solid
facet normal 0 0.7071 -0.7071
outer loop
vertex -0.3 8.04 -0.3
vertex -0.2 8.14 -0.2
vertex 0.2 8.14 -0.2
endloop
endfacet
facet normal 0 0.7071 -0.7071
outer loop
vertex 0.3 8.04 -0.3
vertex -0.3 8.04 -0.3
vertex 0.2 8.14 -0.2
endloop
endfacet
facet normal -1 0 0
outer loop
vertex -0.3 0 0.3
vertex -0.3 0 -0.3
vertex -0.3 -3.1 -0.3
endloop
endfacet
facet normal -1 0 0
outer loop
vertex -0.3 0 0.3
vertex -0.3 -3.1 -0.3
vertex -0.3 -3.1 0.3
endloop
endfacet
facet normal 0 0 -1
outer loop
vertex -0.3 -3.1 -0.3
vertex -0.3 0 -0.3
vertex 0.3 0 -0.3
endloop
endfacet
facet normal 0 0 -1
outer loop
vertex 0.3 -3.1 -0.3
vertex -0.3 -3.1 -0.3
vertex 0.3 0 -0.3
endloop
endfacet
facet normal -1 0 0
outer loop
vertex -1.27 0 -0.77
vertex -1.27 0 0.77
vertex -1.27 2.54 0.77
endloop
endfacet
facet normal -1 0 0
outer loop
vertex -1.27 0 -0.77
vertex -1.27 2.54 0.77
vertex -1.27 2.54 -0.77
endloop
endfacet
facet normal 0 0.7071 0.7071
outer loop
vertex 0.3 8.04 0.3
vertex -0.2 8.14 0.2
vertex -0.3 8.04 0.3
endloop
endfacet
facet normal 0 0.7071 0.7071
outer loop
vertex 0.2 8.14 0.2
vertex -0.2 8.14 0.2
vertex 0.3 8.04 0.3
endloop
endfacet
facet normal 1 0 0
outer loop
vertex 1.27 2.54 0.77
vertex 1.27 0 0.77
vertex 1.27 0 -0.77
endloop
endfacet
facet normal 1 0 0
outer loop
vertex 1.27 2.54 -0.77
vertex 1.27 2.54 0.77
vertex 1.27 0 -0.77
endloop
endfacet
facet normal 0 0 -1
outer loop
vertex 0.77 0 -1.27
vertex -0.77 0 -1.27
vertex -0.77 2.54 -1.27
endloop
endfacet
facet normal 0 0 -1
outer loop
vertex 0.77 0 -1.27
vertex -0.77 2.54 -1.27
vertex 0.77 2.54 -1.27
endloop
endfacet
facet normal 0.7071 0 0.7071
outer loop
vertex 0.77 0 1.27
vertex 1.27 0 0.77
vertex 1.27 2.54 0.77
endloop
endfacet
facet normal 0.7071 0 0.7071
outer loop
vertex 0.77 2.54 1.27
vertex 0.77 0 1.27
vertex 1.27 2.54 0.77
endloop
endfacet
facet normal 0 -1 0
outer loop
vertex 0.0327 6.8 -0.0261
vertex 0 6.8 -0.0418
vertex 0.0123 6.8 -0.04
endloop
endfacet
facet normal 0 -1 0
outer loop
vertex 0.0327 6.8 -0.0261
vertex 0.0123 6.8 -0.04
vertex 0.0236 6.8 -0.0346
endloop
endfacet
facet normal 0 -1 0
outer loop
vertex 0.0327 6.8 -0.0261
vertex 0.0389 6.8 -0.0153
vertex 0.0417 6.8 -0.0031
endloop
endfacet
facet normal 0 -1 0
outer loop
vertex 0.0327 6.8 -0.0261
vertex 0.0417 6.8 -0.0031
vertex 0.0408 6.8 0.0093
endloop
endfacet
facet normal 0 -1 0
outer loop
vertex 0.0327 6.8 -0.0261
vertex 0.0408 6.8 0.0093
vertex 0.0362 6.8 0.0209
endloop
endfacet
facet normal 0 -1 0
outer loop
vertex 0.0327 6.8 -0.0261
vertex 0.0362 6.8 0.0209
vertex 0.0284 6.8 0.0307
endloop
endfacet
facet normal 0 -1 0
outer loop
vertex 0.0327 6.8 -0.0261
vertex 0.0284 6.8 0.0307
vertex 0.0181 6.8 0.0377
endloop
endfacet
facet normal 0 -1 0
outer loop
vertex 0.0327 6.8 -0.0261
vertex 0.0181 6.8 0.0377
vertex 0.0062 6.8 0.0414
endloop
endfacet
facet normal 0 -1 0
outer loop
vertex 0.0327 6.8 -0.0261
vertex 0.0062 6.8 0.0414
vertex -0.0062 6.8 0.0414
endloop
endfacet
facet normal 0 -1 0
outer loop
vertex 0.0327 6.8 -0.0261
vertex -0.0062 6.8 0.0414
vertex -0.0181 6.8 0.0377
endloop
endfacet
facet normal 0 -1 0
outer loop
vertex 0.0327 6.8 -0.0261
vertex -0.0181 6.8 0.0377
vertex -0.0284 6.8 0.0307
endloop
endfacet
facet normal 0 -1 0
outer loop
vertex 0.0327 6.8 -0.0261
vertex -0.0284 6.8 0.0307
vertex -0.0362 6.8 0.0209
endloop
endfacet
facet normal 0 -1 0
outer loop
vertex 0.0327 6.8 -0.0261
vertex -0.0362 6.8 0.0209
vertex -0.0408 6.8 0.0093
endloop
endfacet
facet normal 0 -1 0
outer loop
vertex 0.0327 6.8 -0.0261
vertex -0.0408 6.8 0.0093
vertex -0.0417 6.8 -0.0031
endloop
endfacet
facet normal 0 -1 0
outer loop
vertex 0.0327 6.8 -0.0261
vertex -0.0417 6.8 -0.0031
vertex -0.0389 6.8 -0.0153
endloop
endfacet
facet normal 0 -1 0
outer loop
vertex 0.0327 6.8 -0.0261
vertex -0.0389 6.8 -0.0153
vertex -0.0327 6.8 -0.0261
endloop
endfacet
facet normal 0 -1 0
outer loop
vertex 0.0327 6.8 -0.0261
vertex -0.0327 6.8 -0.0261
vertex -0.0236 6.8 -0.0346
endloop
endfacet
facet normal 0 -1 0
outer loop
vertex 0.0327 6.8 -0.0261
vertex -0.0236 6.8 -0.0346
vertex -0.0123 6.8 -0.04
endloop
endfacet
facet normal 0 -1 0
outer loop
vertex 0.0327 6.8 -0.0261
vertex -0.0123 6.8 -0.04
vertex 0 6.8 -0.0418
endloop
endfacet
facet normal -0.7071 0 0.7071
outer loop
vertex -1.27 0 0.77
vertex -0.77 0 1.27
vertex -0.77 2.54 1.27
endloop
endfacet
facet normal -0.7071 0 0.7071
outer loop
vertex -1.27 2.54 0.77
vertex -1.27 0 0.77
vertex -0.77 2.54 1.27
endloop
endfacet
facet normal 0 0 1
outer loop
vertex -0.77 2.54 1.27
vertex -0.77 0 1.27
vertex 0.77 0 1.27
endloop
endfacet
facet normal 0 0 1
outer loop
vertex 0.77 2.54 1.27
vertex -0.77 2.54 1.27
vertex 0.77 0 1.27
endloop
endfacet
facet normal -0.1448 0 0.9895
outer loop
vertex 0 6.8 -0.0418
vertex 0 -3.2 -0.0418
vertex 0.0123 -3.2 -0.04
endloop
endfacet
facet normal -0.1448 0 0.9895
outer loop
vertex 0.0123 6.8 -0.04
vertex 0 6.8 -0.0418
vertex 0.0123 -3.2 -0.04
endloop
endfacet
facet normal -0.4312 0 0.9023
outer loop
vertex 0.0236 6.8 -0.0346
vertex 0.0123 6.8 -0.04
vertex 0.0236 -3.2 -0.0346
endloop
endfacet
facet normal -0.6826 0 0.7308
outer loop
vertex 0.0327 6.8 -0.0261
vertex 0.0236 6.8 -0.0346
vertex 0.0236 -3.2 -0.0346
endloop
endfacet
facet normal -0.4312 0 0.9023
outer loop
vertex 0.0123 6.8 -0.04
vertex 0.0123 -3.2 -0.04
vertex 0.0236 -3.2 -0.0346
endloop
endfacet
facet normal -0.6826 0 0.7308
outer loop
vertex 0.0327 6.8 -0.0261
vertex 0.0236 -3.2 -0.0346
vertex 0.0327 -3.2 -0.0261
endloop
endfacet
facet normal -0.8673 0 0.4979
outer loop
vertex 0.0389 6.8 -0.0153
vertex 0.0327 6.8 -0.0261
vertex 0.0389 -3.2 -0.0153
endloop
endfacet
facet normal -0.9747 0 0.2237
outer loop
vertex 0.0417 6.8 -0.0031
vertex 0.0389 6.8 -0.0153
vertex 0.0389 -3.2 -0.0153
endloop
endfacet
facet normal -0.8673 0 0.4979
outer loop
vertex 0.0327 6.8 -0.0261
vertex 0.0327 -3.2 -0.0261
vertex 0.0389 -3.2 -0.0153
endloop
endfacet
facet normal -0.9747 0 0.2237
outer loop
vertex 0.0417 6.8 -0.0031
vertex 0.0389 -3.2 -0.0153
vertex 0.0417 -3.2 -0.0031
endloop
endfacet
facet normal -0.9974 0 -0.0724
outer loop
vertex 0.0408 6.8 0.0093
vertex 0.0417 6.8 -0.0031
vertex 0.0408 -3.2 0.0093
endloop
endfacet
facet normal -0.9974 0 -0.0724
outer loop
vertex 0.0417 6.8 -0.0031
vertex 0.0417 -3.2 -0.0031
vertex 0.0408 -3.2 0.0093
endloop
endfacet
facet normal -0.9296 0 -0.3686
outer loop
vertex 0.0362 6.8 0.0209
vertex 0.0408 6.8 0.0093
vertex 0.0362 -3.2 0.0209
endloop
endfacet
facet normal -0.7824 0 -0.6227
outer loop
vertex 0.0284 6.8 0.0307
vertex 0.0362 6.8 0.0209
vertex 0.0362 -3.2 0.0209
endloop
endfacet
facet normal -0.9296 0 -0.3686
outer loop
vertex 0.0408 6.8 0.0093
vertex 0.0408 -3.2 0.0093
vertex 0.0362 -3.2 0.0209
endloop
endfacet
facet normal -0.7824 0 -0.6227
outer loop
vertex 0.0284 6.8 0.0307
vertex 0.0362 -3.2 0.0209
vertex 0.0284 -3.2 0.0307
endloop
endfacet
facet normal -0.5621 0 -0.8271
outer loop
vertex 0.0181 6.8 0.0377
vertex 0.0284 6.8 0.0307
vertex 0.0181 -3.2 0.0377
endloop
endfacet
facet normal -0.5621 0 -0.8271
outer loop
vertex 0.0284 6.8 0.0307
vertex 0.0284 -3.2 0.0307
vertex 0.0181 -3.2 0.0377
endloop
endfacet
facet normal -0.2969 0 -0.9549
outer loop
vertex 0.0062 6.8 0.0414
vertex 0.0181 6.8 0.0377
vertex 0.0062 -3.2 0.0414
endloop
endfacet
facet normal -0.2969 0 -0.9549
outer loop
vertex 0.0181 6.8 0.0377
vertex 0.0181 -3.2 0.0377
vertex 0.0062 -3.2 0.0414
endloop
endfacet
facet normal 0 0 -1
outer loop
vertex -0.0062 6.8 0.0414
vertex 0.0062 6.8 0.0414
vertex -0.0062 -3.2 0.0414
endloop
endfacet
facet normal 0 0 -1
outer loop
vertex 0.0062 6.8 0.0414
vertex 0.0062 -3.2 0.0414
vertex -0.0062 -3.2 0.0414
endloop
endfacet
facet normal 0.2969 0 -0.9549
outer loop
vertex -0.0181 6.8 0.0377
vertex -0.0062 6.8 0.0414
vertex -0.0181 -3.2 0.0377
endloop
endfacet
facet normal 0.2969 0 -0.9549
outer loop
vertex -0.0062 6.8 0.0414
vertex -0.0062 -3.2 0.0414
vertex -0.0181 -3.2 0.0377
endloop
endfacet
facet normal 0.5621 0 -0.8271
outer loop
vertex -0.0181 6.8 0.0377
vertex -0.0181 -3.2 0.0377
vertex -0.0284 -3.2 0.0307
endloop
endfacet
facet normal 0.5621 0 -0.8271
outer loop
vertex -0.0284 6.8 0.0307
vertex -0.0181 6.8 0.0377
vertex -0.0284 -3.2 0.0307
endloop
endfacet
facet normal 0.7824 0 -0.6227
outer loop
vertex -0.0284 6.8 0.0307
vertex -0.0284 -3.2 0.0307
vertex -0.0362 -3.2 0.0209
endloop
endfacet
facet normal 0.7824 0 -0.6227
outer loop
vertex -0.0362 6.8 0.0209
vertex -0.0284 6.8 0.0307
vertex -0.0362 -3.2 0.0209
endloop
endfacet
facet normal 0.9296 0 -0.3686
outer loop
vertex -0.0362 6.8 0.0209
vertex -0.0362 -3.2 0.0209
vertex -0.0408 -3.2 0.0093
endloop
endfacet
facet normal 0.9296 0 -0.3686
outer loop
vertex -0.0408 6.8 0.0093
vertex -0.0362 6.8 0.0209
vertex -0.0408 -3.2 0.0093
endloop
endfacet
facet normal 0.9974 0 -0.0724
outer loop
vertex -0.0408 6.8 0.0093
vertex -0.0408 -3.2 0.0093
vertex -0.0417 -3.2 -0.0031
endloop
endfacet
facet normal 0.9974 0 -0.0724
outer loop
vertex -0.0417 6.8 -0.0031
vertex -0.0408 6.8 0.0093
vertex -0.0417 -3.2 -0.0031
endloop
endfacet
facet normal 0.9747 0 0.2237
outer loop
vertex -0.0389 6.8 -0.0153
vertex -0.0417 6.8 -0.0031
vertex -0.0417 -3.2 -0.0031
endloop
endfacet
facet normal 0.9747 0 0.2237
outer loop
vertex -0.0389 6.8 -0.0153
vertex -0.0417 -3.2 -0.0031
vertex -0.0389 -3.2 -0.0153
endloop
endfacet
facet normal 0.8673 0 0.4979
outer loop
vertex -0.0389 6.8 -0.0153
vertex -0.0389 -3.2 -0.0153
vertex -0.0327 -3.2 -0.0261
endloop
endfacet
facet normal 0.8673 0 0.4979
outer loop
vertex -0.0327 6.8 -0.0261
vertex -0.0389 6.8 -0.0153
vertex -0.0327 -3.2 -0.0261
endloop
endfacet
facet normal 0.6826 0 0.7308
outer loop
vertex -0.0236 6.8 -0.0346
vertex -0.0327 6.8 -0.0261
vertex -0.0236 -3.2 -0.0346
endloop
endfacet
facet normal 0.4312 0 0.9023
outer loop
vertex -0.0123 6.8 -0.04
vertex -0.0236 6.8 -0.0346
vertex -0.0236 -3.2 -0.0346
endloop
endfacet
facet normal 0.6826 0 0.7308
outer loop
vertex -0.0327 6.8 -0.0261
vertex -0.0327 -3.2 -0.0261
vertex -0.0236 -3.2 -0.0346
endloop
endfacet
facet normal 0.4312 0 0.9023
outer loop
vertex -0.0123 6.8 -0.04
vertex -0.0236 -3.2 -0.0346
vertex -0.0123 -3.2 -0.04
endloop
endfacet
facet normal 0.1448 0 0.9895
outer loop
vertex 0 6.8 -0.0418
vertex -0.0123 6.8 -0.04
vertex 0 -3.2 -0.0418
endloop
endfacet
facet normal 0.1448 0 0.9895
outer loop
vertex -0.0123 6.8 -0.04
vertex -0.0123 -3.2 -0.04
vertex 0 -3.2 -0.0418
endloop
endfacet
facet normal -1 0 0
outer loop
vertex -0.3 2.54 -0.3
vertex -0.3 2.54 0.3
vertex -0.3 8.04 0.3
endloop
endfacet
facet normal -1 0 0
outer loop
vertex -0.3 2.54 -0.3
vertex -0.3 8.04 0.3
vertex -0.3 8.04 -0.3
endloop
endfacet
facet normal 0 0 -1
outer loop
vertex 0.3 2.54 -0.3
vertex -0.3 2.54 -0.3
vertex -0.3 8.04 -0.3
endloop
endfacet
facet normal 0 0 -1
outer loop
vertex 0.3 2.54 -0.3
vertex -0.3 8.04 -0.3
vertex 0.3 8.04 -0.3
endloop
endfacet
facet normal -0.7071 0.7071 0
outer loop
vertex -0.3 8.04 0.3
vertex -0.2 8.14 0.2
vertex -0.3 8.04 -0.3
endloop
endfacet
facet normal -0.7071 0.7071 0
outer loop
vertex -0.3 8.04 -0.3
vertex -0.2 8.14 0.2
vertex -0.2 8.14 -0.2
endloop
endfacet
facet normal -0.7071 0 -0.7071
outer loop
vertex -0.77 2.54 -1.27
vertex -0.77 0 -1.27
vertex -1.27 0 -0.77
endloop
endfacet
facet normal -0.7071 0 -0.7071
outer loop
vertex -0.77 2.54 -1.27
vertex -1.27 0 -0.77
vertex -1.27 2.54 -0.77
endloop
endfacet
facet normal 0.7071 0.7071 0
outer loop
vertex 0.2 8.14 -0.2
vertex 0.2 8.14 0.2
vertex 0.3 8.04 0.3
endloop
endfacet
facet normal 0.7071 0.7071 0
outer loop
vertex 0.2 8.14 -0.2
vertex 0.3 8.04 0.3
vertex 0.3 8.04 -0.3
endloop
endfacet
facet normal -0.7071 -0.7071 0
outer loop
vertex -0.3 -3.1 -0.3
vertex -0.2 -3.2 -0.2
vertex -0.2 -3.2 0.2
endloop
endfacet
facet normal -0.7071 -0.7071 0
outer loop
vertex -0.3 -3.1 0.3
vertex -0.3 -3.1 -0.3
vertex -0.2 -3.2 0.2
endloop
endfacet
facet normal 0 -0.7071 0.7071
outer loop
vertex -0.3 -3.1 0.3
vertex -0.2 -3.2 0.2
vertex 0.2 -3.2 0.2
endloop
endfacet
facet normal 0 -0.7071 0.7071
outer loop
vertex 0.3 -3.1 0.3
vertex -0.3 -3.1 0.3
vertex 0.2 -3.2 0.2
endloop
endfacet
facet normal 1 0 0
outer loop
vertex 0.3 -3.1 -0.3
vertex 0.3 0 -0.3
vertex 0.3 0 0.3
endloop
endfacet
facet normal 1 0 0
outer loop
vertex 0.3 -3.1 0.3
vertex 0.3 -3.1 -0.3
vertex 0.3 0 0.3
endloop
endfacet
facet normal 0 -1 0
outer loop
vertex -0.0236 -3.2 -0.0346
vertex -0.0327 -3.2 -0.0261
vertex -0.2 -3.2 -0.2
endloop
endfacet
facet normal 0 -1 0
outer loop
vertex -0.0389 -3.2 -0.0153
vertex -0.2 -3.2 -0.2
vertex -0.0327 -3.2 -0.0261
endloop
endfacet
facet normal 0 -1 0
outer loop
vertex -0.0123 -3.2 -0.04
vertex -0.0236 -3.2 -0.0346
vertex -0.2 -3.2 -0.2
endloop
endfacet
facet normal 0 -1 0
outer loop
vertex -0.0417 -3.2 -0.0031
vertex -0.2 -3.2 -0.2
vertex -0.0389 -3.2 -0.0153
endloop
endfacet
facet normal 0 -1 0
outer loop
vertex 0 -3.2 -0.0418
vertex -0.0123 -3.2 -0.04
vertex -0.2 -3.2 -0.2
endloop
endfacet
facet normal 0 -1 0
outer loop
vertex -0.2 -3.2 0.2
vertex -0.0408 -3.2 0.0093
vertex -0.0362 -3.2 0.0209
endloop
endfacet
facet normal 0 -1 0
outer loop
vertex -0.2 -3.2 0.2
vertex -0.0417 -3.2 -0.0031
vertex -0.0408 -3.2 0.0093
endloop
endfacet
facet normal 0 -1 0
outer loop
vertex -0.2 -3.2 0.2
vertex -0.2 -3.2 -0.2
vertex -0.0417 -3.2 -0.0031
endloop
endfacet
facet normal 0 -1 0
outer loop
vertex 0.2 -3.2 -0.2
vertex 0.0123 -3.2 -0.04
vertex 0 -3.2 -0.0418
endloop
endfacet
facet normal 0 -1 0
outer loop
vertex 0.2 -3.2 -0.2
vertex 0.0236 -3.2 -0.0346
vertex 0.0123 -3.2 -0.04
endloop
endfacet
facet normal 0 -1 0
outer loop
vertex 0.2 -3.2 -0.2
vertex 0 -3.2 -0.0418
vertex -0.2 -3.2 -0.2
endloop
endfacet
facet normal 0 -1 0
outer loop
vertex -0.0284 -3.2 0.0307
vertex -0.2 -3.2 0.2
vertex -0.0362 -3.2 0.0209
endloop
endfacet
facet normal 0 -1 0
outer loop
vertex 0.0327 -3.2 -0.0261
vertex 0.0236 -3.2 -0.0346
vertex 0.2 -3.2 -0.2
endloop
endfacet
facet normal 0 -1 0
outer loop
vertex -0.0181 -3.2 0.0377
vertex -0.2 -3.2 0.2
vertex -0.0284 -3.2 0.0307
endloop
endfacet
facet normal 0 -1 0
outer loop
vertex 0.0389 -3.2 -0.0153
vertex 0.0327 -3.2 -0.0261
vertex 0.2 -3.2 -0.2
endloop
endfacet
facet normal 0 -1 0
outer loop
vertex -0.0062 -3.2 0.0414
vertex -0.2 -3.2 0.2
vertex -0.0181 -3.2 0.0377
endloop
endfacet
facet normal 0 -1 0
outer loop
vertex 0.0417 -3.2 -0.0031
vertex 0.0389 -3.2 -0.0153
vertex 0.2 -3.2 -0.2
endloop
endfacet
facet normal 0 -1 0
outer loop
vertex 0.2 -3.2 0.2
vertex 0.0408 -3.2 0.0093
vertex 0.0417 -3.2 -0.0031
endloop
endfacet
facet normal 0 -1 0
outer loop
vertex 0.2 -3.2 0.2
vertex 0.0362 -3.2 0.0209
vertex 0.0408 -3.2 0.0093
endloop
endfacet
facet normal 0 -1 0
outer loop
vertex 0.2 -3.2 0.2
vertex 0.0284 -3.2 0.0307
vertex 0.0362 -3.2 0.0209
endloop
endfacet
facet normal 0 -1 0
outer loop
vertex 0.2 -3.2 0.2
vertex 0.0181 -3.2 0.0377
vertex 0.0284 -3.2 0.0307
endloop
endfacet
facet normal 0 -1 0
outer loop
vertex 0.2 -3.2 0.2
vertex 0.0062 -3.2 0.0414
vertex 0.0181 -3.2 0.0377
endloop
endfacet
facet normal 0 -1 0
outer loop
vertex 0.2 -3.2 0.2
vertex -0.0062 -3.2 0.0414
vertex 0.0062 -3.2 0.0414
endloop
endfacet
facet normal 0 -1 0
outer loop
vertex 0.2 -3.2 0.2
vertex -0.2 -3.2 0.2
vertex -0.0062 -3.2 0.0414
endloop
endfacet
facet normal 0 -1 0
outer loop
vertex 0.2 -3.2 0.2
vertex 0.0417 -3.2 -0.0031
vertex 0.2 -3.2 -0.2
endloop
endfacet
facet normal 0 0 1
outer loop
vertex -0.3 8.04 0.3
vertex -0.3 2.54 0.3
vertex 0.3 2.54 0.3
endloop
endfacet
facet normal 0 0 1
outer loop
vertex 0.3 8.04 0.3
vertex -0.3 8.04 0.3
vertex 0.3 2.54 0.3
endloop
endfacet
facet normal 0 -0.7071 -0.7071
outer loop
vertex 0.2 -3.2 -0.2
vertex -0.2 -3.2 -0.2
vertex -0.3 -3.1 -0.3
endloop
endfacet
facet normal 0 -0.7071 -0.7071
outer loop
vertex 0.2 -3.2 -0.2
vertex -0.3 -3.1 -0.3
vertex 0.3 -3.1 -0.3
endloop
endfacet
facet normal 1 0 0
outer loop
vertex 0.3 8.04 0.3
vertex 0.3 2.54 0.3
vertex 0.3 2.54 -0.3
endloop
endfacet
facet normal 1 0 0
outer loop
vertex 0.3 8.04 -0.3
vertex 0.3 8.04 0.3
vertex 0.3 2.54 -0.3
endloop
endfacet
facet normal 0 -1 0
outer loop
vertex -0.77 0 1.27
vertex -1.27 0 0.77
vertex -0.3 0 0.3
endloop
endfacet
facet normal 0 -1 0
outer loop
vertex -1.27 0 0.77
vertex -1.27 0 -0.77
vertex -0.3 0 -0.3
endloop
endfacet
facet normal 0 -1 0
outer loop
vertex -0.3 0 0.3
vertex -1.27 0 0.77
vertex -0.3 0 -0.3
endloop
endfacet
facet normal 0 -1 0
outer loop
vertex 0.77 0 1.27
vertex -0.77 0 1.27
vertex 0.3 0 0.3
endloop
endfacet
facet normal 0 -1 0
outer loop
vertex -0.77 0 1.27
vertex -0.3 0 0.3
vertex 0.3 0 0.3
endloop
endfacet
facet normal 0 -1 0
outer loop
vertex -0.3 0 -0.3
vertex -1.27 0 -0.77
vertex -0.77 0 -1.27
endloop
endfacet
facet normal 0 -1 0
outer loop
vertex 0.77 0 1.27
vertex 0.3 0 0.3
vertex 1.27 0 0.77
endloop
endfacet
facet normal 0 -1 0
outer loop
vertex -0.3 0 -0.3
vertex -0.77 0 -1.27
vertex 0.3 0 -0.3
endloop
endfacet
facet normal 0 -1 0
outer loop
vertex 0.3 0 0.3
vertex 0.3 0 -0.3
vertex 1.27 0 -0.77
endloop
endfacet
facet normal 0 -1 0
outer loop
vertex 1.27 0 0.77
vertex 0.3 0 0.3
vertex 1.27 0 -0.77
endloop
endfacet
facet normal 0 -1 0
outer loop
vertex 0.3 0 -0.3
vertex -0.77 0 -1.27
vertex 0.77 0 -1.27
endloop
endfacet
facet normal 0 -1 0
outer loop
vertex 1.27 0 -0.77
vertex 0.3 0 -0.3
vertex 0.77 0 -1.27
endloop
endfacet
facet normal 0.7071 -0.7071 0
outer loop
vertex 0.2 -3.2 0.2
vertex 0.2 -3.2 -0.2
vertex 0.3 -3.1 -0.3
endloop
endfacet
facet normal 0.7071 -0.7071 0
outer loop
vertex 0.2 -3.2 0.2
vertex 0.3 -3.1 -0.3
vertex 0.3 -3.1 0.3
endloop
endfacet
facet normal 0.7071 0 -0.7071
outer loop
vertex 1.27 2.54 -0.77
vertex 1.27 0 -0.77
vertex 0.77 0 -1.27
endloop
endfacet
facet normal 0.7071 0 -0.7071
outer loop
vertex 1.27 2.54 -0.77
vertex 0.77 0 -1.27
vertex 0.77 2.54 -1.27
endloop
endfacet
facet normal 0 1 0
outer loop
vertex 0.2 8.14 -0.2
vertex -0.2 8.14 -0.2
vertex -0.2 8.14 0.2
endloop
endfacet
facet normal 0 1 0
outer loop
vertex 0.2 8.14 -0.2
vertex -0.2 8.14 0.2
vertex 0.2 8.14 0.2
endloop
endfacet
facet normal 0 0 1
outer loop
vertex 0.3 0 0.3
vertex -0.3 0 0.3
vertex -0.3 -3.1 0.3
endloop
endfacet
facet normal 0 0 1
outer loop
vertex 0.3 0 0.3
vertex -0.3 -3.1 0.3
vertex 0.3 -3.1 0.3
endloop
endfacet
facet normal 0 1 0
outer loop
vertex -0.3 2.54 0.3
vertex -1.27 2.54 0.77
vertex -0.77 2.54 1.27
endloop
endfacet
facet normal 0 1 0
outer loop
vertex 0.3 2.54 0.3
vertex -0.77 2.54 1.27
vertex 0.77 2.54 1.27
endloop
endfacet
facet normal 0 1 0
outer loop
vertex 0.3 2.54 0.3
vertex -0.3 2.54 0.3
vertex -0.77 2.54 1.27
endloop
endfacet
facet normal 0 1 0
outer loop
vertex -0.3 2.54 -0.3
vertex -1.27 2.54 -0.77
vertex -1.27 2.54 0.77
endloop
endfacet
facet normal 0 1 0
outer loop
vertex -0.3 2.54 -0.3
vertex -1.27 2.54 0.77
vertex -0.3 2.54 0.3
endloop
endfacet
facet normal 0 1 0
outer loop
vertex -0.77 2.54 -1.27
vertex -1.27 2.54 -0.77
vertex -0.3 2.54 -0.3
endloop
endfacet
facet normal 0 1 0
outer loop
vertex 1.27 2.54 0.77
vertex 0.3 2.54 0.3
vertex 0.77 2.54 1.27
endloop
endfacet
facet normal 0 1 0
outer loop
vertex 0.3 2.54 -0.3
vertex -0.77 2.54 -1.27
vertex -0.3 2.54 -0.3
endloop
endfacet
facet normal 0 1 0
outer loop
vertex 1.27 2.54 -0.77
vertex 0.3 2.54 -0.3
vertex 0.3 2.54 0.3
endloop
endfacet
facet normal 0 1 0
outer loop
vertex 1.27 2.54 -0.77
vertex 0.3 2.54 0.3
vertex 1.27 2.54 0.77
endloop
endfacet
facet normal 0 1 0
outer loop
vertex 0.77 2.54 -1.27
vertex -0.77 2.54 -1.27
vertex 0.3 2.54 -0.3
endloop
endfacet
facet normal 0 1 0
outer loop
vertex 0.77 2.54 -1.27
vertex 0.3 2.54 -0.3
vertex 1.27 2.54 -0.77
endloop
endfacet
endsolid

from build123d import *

# Parameters (mm, degrees)
SKETCH_1_W          = 2.54
SKETCH_1_H          = 2.54
EXTRUDE_1_DEPTH     = 2.54
SKETCH_2_W          = 0.6
SKETCH_2_H          = 0.6
EXTRUDE_2_DEPTH     = 5.6
SKETCH_3_W          = 0.6
SKETCH_3_H          = 0.6
EXTRUDE_3_DEPTH     = 3.2
CHAMFER_1_SIZE      = 0.1
CHAMFER_2_SIZE      = 0.5
SKETCH_4_R          = 0.041822452
CUT_EXTRUDE_1_DEPTH = 10


with BuildPart() as part:
    # 草图1 → 凸台-拉伸1 (new body)
    with BuildSketch(Plane(origin=(0, 0, 0), x_dir=(1, 0, 0), z_dir=(0, 1, 0))):
        Rectangle(SKETCH_1_W, SKETCH_1_H)
    extrude(amount=EXTRUDE_1_DEPTH)

    # 草图2 → 凸台-拉伸2 (add)
    with BuildSketch(Plane(origin=(0, 2.54, 0), x_dir=(1, 0, 0), z_dir=(0, 1, 0))):
        Rectangle(SKETCH_2_W, SKETCH_2_H)
    extrude(amount=EXTRUDE_2_DEPTH)

    # 草图3 → 凸台-拉伸3 (add)
    with BuildSketch(Plane.XZ):
        Rectangle(SKETCH_3_W, SKETCH_3_H)
    extrude(amount=EXTRUDE_3_DEPTH)

    # 倒角1
    chamfer_1_edges = [part.edges().sort_by_distance(p)[0] for p in [
        (0.3, 8.14, 0),
        (0, 8.14, -0.3),
        (-0.3, 8.14, 0),
        (0, 8.14, 0.3),
        (-0.3, -3.2, 0),
        (0, -3.2, -0.3),
        (0.3, -3.2, 0),
        (0, -3.2, 0.3),
    ]]
    chamfer(chamfer_1_edges, length=CHAMFER_1_SIZE)

    # 倒角2
    chamfer_2_edges = [part.edges().sort_by_distance(p)[0] for p in [
        (1.27, 1.27, 1.27),
        (-1.27, 1.27, 1.27),
        (-1.27, 1.27, -1.27),
        (1.27, 1.27, -1.27),
    ]]
    chamfer(chamfer_2_edges, length=CHAMFER_2_SIZE)

    # 草图4 → 切除-拉伸1 (cut)
    with BuildSketch(Plane.XZ.offset(3.2)):
        with Locations(Location((0, 0, 0), (0, 0, 270))):
            Circle(SKETCH_4_R)
    extrude(amount=-CUT_EXTRUDE_1_DEPTH, mode=Mode.SUBTRACT)


solid = part.part
